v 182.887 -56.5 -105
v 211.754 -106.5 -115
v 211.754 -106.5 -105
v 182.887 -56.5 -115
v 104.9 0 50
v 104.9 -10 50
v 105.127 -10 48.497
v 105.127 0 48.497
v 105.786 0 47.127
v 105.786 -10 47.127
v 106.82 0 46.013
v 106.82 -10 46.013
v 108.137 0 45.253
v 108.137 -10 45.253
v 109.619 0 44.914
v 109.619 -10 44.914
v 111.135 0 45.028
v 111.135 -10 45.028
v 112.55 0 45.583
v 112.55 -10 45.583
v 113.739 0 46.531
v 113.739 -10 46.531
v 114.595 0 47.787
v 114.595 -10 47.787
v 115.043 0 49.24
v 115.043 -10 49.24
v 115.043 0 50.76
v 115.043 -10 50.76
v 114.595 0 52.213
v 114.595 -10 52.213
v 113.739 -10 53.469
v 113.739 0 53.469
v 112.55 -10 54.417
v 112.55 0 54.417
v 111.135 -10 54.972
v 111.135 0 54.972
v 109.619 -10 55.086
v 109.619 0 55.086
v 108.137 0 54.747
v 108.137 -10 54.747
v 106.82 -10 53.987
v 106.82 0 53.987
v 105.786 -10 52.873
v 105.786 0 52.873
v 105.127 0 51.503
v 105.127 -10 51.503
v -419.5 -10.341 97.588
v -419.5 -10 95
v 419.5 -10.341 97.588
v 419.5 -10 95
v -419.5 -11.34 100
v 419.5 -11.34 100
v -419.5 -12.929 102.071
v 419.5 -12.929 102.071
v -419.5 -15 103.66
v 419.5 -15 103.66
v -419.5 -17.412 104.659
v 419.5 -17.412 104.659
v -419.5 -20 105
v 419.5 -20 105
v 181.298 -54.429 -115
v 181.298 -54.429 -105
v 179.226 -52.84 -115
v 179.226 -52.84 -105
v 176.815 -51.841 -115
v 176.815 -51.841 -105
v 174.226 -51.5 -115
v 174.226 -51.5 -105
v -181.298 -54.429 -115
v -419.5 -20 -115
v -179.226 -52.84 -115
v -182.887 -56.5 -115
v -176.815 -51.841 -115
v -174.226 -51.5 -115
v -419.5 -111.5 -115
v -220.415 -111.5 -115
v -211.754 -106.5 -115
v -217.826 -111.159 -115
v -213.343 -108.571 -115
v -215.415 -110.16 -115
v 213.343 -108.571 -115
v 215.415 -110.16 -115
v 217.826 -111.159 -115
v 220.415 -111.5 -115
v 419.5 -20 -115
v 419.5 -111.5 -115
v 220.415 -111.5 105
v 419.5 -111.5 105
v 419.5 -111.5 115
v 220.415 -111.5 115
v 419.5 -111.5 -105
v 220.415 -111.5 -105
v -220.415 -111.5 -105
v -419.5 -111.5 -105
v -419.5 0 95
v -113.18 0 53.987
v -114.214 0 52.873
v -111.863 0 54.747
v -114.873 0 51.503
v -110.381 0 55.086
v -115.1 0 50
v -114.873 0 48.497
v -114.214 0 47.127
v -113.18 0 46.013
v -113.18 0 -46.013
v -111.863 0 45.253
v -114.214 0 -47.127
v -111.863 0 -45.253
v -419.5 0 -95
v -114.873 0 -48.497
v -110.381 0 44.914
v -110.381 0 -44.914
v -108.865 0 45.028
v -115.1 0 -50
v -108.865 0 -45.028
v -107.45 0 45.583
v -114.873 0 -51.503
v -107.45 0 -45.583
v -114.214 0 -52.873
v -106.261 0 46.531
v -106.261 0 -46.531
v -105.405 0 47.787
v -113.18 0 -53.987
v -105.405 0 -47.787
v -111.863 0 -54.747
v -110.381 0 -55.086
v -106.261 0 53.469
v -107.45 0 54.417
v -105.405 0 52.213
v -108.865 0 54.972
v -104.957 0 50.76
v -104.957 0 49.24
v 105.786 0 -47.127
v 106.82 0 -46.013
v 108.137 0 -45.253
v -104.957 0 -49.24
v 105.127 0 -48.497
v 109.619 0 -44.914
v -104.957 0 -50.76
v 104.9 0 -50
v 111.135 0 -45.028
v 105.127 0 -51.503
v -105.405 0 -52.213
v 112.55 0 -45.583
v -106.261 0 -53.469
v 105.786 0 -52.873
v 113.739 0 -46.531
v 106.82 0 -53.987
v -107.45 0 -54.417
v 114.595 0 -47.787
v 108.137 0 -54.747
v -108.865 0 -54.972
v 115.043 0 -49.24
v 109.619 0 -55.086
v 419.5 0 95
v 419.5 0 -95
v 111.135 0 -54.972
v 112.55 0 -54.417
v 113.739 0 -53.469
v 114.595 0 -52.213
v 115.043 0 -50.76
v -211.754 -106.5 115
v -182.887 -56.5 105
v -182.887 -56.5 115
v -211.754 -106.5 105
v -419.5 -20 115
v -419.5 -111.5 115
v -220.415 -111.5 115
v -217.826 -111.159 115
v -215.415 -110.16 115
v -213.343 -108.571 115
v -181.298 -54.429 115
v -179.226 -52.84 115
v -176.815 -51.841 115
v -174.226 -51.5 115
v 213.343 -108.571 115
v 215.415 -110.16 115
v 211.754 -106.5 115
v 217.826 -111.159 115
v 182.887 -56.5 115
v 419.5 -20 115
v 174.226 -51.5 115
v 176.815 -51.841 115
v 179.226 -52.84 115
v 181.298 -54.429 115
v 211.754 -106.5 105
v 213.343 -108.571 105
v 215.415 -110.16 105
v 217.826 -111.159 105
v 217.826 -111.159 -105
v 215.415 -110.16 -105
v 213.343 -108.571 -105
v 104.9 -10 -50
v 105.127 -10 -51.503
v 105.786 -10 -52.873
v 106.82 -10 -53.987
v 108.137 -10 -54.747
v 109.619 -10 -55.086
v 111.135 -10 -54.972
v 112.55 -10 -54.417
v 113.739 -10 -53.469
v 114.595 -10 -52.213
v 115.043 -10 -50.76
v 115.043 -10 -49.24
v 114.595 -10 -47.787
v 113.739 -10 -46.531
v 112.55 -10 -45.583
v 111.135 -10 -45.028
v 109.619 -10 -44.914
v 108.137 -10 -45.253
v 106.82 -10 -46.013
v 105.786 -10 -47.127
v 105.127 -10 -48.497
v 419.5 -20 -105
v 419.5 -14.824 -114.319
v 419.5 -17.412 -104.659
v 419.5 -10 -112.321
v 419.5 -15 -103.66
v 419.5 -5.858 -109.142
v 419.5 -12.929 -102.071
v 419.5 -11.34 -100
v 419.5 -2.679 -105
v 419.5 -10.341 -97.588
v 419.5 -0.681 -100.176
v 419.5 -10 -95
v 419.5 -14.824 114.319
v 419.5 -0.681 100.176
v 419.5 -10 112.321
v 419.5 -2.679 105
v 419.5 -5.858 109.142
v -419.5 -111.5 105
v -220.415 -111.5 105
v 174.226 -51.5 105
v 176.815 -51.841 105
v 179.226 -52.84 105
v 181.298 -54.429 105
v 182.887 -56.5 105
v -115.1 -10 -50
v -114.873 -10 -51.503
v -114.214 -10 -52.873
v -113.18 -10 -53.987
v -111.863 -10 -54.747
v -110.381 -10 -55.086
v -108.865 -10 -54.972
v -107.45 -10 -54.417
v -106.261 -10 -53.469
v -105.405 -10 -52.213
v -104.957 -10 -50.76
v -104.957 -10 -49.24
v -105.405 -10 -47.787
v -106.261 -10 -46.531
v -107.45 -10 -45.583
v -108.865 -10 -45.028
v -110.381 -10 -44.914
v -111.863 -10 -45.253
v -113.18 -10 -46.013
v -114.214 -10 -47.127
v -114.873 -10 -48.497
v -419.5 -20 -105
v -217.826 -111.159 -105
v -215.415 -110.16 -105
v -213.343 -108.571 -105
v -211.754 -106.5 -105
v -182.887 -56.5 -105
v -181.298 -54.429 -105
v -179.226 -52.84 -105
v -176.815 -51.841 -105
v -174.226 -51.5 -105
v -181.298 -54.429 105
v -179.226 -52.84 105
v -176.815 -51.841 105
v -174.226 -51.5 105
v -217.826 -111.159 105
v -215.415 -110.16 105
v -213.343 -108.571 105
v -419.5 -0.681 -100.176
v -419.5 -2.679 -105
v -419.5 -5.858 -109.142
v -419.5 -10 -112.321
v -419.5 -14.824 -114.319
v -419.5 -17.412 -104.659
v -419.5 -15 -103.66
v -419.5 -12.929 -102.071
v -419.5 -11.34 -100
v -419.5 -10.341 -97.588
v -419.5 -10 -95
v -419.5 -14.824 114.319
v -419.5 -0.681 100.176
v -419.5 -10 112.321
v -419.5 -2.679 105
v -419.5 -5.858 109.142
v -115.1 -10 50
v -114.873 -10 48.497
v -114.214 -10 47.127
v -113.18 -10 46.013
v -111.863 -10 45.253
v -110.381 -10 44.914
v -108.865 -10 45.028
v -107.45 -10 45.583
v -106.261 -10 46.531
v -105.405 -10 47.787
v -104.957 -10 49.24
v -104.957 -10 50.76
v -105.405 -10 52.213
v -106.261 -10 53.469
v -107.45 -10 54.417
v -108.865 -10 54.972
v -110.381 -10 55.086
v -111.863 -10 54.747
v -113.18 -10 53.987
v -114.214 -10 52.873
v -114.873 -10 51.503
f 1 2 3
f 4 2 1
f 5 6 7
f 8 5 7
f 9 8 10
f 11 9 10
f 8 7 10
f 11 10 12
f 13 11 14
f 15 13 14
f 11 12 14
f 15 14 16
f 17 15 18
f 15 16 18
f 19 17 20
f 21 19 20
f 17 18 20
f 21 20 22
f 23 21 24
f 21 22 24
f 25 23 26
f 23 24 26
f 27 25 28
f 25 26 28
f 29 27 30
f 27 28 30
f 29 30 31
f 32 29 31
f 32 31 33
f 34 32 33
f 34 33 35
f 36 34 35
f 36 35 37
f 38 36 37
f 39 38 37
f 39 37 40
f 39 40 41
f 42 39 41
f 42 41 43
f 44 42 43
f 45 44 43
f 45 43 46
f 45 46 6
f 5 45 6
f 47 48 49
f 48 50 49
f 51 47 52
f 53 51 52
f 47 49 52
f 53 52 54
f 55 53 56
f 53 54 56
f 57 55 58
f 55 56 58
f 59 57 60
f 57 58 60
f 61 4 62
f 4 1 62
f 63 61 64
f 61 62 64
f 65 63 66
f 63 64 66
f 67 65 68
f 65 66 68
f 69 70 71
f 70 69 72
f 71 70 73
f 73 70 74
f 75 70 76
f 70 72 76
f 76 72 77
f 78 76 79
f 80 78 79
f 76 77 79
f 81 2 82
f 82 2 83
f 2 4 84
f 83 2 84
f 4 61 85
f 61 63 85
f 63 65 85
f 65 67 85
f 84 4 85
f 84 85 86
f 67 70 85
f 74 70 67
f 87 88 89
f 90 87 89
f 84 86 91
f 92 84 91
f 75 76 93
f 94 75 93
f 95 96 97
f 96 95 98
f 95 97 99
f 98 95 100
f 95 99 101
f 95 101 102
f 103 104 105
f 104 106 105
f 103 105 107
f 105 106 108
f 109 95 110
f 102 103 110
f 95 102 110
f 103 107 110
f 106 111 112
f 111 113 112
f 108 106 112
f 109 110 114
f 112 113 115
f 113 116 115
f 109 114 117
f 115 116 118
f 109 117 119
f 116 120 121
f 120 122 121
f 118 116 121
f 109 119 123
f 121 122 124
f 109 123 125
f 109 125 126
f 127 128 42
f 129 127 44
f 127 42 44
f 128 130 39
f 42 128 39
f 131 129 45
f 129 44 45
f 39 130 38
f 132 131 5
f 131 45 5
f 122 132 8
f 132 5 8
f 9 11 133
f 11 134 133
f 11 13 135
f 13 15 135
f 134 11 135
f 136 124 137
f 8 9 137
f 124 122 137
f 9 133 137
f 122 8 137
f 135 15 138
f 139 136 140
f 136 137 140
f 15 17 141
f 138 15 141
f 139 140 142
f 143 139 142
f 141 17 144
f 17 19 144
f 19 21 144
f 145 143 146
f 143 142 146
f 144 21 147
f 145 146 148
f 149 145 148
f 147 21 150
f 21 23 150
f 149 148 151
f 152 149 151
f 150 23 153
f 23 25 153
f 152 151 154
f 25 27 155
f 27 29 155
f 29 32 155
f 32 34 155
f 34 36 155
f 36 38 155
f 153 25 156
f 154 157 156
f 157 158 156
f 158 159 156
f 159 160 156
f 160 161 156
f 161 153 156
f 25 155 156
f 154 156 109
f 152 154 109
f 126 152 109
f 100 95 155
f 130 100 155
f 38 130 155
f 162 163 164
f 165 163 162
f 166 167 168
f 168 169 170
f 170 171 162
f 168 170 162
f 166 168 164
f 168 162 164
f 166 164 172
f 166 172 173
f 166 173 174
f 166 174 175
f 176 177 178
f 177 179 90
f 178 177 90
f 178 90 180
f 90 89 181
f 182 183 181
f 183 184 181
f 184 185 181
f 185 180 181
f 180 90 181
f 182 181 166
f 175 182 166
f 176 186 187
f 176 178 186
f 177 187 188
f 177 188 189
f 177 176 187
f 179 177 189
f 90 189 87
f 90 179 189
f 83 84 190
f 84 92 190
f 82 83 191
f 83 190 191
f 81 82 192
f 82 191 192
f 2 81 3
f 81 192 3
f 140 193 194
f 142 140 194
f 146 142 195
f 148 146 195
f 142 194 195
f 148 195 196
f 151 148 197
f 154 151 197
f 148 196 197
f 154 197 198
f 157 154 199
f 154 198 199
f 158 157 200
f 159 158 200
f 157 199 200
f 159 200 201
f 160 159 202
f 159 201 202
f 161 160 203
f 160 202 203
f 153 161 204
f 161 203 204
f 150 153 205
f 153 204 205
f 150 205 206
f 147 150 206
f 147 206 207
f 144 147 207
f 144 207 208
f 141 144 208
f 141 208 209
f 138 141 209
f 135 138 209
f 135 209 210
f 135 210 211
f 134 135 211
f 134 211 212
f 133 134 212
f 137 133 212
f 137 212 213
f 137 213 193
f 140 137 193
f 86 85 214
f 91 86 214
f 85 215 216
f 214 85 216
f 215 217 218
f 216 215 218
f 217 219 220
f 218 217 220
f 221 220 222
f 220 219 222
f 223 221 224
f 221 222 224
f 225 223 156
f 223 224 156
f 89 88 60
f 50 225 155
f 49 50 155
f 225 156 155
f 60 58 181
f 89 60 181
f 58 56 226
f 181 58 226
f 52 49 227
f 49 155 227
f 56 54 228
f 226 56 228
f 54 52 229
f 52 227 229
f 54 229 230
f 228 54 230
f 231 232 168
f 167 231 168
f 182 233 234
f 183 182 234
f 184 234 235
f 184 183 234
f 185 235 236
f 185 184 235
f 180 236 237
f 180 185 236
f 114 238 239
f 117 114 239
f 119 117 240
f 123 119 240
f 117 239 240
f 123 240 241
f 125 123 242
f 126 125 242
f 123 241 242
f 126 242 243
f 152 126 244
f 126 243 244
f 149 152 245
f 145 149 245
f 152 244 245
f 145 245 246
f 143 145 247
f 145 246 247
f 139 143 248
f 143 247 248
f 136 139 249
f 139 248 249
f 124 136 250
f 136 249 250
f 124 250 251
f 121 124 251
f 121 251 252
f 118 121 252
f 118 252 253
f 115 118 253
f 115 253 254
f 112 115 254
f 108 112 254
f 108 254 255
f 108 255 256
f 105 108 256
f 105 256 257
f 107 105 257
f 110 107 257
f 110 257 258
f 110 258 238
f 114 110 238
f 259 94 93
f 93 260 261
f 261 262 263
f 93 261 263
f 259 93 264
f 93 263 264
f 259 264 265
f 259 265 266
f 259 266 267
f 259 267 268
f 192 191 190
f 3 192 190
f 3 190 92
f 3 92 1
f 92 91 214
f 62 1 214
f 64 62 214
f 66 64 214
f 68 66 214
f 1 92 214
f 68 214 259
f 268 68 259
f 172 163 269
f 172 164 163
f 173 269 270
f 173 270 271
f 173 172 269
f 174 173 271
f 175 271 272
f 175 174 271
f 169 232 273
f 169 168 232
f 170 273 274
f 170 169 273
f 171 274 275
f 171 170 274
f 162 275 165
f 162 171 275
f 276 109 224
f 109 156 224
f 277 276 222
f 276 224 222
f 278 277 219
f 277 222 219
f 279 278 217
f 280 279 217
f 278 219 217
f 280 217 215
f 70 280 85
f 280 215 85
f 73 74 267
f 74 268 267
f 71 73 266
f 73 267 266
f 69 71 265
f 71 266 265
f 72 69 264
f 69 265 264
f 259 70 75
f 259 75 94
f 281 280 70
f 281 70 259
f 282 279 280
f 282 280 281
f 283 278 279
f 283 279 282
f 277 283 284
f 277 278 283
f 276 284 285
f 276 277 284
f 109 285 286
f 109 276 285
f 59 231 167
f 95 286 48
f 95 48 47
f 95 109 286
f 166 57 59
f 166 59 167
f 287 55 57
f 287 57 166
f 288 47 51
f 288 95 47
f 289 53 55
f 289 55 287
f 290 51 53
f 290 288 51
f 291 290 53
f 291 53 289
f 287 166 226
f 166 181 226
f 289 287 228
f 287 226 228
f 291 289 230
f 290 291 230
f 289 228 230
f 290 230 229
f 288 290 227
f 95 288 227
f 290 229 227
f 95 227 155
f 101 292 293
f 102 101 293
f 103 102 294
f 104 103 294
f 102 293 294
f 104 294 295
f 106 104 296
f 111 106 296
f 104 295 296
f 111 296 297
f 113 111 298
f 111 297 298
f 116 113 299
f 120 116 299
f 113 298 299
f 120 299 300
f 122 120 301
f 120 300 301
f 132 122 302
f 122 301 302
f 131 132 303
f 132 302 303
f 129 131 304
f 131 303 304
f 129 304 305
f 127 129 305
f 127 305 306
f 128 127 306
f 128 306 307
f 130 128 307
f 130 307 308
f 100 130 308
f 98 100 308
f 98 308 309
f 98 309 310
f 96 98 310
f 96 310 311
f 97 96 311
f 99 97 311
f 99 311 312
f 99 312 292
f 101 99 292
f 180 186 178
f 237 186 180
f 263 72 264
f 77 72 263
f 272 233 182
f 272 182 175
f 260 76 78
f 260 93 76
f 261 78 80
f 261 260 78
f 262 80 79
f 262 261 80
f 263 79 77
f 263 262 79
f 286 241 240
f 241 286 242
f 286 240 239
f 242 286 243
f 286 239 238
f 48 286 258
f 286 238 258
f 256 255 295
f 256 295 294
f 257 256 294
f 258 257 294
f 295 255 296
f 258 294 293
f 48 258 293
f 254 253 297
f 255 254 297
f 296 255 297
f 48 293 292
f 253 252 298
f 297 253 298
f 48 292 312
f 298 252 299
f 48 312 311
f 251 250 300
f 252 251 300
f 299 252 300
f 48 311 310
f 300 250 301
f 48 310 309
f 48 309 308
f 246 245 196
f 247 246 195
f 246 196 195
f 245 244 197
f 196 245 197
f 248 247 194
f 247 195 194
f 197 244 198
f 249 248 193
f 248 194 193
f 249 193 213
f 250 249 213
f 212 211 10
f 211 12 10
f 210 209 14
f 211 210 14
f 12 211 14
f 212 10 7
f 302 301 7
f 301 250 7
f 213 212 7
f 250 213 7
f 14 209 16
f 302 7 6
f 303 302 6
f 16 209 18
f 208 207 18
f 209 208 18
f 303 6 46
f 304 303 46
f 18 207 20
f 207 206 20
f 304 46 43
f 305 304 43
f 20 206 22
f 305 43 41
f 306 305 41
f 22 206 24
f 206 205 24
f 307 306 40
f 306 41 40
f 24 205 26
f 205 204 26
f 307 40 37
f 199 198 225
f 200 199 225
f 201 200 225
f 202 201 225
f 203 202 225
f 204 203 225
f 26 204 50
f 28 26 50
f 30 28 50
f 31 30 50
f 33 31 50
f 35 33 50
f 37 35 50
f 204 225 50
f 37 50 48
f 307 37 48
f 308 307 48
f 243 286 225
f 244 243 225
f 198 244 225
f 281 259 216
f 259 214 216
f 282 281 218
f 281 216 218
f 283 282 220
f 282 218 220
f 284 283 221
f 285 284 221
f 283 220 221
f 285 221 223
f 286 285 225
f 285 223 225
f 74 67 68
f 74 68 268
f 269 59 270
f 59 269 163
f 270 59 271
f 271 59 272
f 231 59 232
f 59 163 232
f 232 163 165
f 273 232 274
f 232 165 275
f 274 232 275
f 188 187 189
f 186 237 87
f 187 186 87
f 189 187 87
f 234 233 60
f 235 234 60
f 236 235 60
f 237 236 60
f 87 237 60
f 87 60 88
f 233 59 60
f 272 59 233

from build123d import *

# Parameters (mm, degrees)
SM_BASE_FLANGE_1_DEPTH  = 419.5
CUT_EXTRUDE_1_DEPTH     = 492.235686814
FILLET_1_R              = 10
HOLE_WIZARD_M12_1_D     = 10.2
HOLE_WIZARD_M12_1_DEPTH = 32.75
HOLE_WIZARD_M12_1_TIP   = 3.064389157


# Sheet-metal steps are written as plain solids
with BuildPart() as part:
    # Sketch 1 → 基体-法兰1 (new, symmetric)
    with BuildSketch(Plane(origin=(0, 0, 0), x_dir=(0, 0, -1), z_dir=(1, 0, 0))):
        with BuildLine():
            Line((-115, -111.5), (-115, -20))
            ThreePointArc((-115, -20), (-109.142135624, -5.857864376), (-95, 0))
            Line((-95, 0), (95, 0))
            ThreePointArc((95, 0), (109.142135624, -5.857864376), (115, -20))
            Line((115, -20), (115, -111.5))
            Line((115, -111.5), (105, -111.5))
            Line((105, -111.5), (105, -20))
            ThreePointArc((105, -20), (102.071067812, -12.928932188), (95, -10))
            Line((95, -10), (-95, -10))
            ThreePointArc((-95, -10), (-102.071067812, -12.928932188), (-105, -20))
            Line((-105, -20), (-105, -111.5))
            Line((-105, -111.5), (-115, -111.5))
        make_face()
    extrude(amount=SM_BASE_FLANGE_1_DEPTH, both=True)

    # Sketch 2 → 切除-拉伸1 (cut, through all)
    with BuildSketch(Plane(origin=(0, 0, -115), x_dir=(-1, 0, 0), z_dir=(0, 0, -1))):
        Polygon((-214.641016151, -111.5), (-180, -51.5), (180, -51.5), (214.641016151, -111.5), align=None)
    extrude(amount=-CUT_EXTRUDE_1_DEPTH, mode=Mode.SUBTRACT)

    # 圆角1
    fillet_1_edges = [part.edges().sort_by_distance(p)[0] for p in [
        (-214.641016151, -111.5, -110),
        (214.641016151, -111.5, -110),
        (180, -51.5, -110),
        (-180, -51.5, -110),
        (214.641016151, -111.5, 110),
        (-214.641016151, -111.5, 110),
        (-180, -51.5, 110),
        (180, -51.5, 110),
    ]]
    fillet(fillet_1_edges, radius=FILLET_1_R)

    # M12 螺纹孔1
    with Locations(Plane(origin=(0, 0, 0), x_dir=(1, 0, 0), z_dir=(0, 1, 0))):
        with Locations((-110, 50), (110, 50), (110, -50), (-110, -50)):
            Hole(HOLE_WIZARD_M12_1_D / 2, depth=HOLE_WIZARD_M12_1_DEPTH)
            with Locations((0, 0, -(HOLE_WIZARD_M12_1_DEPTH + HOLE_WIZARD_M12_1_TIP / 2))):  # 118° drill point
                Cone(0, HOLE_WIZARD_M12_1_D / 2, HOLE_WIZARD_M12_1_TIP, mode=Mode.SUBTRACT)


solid = part.part
